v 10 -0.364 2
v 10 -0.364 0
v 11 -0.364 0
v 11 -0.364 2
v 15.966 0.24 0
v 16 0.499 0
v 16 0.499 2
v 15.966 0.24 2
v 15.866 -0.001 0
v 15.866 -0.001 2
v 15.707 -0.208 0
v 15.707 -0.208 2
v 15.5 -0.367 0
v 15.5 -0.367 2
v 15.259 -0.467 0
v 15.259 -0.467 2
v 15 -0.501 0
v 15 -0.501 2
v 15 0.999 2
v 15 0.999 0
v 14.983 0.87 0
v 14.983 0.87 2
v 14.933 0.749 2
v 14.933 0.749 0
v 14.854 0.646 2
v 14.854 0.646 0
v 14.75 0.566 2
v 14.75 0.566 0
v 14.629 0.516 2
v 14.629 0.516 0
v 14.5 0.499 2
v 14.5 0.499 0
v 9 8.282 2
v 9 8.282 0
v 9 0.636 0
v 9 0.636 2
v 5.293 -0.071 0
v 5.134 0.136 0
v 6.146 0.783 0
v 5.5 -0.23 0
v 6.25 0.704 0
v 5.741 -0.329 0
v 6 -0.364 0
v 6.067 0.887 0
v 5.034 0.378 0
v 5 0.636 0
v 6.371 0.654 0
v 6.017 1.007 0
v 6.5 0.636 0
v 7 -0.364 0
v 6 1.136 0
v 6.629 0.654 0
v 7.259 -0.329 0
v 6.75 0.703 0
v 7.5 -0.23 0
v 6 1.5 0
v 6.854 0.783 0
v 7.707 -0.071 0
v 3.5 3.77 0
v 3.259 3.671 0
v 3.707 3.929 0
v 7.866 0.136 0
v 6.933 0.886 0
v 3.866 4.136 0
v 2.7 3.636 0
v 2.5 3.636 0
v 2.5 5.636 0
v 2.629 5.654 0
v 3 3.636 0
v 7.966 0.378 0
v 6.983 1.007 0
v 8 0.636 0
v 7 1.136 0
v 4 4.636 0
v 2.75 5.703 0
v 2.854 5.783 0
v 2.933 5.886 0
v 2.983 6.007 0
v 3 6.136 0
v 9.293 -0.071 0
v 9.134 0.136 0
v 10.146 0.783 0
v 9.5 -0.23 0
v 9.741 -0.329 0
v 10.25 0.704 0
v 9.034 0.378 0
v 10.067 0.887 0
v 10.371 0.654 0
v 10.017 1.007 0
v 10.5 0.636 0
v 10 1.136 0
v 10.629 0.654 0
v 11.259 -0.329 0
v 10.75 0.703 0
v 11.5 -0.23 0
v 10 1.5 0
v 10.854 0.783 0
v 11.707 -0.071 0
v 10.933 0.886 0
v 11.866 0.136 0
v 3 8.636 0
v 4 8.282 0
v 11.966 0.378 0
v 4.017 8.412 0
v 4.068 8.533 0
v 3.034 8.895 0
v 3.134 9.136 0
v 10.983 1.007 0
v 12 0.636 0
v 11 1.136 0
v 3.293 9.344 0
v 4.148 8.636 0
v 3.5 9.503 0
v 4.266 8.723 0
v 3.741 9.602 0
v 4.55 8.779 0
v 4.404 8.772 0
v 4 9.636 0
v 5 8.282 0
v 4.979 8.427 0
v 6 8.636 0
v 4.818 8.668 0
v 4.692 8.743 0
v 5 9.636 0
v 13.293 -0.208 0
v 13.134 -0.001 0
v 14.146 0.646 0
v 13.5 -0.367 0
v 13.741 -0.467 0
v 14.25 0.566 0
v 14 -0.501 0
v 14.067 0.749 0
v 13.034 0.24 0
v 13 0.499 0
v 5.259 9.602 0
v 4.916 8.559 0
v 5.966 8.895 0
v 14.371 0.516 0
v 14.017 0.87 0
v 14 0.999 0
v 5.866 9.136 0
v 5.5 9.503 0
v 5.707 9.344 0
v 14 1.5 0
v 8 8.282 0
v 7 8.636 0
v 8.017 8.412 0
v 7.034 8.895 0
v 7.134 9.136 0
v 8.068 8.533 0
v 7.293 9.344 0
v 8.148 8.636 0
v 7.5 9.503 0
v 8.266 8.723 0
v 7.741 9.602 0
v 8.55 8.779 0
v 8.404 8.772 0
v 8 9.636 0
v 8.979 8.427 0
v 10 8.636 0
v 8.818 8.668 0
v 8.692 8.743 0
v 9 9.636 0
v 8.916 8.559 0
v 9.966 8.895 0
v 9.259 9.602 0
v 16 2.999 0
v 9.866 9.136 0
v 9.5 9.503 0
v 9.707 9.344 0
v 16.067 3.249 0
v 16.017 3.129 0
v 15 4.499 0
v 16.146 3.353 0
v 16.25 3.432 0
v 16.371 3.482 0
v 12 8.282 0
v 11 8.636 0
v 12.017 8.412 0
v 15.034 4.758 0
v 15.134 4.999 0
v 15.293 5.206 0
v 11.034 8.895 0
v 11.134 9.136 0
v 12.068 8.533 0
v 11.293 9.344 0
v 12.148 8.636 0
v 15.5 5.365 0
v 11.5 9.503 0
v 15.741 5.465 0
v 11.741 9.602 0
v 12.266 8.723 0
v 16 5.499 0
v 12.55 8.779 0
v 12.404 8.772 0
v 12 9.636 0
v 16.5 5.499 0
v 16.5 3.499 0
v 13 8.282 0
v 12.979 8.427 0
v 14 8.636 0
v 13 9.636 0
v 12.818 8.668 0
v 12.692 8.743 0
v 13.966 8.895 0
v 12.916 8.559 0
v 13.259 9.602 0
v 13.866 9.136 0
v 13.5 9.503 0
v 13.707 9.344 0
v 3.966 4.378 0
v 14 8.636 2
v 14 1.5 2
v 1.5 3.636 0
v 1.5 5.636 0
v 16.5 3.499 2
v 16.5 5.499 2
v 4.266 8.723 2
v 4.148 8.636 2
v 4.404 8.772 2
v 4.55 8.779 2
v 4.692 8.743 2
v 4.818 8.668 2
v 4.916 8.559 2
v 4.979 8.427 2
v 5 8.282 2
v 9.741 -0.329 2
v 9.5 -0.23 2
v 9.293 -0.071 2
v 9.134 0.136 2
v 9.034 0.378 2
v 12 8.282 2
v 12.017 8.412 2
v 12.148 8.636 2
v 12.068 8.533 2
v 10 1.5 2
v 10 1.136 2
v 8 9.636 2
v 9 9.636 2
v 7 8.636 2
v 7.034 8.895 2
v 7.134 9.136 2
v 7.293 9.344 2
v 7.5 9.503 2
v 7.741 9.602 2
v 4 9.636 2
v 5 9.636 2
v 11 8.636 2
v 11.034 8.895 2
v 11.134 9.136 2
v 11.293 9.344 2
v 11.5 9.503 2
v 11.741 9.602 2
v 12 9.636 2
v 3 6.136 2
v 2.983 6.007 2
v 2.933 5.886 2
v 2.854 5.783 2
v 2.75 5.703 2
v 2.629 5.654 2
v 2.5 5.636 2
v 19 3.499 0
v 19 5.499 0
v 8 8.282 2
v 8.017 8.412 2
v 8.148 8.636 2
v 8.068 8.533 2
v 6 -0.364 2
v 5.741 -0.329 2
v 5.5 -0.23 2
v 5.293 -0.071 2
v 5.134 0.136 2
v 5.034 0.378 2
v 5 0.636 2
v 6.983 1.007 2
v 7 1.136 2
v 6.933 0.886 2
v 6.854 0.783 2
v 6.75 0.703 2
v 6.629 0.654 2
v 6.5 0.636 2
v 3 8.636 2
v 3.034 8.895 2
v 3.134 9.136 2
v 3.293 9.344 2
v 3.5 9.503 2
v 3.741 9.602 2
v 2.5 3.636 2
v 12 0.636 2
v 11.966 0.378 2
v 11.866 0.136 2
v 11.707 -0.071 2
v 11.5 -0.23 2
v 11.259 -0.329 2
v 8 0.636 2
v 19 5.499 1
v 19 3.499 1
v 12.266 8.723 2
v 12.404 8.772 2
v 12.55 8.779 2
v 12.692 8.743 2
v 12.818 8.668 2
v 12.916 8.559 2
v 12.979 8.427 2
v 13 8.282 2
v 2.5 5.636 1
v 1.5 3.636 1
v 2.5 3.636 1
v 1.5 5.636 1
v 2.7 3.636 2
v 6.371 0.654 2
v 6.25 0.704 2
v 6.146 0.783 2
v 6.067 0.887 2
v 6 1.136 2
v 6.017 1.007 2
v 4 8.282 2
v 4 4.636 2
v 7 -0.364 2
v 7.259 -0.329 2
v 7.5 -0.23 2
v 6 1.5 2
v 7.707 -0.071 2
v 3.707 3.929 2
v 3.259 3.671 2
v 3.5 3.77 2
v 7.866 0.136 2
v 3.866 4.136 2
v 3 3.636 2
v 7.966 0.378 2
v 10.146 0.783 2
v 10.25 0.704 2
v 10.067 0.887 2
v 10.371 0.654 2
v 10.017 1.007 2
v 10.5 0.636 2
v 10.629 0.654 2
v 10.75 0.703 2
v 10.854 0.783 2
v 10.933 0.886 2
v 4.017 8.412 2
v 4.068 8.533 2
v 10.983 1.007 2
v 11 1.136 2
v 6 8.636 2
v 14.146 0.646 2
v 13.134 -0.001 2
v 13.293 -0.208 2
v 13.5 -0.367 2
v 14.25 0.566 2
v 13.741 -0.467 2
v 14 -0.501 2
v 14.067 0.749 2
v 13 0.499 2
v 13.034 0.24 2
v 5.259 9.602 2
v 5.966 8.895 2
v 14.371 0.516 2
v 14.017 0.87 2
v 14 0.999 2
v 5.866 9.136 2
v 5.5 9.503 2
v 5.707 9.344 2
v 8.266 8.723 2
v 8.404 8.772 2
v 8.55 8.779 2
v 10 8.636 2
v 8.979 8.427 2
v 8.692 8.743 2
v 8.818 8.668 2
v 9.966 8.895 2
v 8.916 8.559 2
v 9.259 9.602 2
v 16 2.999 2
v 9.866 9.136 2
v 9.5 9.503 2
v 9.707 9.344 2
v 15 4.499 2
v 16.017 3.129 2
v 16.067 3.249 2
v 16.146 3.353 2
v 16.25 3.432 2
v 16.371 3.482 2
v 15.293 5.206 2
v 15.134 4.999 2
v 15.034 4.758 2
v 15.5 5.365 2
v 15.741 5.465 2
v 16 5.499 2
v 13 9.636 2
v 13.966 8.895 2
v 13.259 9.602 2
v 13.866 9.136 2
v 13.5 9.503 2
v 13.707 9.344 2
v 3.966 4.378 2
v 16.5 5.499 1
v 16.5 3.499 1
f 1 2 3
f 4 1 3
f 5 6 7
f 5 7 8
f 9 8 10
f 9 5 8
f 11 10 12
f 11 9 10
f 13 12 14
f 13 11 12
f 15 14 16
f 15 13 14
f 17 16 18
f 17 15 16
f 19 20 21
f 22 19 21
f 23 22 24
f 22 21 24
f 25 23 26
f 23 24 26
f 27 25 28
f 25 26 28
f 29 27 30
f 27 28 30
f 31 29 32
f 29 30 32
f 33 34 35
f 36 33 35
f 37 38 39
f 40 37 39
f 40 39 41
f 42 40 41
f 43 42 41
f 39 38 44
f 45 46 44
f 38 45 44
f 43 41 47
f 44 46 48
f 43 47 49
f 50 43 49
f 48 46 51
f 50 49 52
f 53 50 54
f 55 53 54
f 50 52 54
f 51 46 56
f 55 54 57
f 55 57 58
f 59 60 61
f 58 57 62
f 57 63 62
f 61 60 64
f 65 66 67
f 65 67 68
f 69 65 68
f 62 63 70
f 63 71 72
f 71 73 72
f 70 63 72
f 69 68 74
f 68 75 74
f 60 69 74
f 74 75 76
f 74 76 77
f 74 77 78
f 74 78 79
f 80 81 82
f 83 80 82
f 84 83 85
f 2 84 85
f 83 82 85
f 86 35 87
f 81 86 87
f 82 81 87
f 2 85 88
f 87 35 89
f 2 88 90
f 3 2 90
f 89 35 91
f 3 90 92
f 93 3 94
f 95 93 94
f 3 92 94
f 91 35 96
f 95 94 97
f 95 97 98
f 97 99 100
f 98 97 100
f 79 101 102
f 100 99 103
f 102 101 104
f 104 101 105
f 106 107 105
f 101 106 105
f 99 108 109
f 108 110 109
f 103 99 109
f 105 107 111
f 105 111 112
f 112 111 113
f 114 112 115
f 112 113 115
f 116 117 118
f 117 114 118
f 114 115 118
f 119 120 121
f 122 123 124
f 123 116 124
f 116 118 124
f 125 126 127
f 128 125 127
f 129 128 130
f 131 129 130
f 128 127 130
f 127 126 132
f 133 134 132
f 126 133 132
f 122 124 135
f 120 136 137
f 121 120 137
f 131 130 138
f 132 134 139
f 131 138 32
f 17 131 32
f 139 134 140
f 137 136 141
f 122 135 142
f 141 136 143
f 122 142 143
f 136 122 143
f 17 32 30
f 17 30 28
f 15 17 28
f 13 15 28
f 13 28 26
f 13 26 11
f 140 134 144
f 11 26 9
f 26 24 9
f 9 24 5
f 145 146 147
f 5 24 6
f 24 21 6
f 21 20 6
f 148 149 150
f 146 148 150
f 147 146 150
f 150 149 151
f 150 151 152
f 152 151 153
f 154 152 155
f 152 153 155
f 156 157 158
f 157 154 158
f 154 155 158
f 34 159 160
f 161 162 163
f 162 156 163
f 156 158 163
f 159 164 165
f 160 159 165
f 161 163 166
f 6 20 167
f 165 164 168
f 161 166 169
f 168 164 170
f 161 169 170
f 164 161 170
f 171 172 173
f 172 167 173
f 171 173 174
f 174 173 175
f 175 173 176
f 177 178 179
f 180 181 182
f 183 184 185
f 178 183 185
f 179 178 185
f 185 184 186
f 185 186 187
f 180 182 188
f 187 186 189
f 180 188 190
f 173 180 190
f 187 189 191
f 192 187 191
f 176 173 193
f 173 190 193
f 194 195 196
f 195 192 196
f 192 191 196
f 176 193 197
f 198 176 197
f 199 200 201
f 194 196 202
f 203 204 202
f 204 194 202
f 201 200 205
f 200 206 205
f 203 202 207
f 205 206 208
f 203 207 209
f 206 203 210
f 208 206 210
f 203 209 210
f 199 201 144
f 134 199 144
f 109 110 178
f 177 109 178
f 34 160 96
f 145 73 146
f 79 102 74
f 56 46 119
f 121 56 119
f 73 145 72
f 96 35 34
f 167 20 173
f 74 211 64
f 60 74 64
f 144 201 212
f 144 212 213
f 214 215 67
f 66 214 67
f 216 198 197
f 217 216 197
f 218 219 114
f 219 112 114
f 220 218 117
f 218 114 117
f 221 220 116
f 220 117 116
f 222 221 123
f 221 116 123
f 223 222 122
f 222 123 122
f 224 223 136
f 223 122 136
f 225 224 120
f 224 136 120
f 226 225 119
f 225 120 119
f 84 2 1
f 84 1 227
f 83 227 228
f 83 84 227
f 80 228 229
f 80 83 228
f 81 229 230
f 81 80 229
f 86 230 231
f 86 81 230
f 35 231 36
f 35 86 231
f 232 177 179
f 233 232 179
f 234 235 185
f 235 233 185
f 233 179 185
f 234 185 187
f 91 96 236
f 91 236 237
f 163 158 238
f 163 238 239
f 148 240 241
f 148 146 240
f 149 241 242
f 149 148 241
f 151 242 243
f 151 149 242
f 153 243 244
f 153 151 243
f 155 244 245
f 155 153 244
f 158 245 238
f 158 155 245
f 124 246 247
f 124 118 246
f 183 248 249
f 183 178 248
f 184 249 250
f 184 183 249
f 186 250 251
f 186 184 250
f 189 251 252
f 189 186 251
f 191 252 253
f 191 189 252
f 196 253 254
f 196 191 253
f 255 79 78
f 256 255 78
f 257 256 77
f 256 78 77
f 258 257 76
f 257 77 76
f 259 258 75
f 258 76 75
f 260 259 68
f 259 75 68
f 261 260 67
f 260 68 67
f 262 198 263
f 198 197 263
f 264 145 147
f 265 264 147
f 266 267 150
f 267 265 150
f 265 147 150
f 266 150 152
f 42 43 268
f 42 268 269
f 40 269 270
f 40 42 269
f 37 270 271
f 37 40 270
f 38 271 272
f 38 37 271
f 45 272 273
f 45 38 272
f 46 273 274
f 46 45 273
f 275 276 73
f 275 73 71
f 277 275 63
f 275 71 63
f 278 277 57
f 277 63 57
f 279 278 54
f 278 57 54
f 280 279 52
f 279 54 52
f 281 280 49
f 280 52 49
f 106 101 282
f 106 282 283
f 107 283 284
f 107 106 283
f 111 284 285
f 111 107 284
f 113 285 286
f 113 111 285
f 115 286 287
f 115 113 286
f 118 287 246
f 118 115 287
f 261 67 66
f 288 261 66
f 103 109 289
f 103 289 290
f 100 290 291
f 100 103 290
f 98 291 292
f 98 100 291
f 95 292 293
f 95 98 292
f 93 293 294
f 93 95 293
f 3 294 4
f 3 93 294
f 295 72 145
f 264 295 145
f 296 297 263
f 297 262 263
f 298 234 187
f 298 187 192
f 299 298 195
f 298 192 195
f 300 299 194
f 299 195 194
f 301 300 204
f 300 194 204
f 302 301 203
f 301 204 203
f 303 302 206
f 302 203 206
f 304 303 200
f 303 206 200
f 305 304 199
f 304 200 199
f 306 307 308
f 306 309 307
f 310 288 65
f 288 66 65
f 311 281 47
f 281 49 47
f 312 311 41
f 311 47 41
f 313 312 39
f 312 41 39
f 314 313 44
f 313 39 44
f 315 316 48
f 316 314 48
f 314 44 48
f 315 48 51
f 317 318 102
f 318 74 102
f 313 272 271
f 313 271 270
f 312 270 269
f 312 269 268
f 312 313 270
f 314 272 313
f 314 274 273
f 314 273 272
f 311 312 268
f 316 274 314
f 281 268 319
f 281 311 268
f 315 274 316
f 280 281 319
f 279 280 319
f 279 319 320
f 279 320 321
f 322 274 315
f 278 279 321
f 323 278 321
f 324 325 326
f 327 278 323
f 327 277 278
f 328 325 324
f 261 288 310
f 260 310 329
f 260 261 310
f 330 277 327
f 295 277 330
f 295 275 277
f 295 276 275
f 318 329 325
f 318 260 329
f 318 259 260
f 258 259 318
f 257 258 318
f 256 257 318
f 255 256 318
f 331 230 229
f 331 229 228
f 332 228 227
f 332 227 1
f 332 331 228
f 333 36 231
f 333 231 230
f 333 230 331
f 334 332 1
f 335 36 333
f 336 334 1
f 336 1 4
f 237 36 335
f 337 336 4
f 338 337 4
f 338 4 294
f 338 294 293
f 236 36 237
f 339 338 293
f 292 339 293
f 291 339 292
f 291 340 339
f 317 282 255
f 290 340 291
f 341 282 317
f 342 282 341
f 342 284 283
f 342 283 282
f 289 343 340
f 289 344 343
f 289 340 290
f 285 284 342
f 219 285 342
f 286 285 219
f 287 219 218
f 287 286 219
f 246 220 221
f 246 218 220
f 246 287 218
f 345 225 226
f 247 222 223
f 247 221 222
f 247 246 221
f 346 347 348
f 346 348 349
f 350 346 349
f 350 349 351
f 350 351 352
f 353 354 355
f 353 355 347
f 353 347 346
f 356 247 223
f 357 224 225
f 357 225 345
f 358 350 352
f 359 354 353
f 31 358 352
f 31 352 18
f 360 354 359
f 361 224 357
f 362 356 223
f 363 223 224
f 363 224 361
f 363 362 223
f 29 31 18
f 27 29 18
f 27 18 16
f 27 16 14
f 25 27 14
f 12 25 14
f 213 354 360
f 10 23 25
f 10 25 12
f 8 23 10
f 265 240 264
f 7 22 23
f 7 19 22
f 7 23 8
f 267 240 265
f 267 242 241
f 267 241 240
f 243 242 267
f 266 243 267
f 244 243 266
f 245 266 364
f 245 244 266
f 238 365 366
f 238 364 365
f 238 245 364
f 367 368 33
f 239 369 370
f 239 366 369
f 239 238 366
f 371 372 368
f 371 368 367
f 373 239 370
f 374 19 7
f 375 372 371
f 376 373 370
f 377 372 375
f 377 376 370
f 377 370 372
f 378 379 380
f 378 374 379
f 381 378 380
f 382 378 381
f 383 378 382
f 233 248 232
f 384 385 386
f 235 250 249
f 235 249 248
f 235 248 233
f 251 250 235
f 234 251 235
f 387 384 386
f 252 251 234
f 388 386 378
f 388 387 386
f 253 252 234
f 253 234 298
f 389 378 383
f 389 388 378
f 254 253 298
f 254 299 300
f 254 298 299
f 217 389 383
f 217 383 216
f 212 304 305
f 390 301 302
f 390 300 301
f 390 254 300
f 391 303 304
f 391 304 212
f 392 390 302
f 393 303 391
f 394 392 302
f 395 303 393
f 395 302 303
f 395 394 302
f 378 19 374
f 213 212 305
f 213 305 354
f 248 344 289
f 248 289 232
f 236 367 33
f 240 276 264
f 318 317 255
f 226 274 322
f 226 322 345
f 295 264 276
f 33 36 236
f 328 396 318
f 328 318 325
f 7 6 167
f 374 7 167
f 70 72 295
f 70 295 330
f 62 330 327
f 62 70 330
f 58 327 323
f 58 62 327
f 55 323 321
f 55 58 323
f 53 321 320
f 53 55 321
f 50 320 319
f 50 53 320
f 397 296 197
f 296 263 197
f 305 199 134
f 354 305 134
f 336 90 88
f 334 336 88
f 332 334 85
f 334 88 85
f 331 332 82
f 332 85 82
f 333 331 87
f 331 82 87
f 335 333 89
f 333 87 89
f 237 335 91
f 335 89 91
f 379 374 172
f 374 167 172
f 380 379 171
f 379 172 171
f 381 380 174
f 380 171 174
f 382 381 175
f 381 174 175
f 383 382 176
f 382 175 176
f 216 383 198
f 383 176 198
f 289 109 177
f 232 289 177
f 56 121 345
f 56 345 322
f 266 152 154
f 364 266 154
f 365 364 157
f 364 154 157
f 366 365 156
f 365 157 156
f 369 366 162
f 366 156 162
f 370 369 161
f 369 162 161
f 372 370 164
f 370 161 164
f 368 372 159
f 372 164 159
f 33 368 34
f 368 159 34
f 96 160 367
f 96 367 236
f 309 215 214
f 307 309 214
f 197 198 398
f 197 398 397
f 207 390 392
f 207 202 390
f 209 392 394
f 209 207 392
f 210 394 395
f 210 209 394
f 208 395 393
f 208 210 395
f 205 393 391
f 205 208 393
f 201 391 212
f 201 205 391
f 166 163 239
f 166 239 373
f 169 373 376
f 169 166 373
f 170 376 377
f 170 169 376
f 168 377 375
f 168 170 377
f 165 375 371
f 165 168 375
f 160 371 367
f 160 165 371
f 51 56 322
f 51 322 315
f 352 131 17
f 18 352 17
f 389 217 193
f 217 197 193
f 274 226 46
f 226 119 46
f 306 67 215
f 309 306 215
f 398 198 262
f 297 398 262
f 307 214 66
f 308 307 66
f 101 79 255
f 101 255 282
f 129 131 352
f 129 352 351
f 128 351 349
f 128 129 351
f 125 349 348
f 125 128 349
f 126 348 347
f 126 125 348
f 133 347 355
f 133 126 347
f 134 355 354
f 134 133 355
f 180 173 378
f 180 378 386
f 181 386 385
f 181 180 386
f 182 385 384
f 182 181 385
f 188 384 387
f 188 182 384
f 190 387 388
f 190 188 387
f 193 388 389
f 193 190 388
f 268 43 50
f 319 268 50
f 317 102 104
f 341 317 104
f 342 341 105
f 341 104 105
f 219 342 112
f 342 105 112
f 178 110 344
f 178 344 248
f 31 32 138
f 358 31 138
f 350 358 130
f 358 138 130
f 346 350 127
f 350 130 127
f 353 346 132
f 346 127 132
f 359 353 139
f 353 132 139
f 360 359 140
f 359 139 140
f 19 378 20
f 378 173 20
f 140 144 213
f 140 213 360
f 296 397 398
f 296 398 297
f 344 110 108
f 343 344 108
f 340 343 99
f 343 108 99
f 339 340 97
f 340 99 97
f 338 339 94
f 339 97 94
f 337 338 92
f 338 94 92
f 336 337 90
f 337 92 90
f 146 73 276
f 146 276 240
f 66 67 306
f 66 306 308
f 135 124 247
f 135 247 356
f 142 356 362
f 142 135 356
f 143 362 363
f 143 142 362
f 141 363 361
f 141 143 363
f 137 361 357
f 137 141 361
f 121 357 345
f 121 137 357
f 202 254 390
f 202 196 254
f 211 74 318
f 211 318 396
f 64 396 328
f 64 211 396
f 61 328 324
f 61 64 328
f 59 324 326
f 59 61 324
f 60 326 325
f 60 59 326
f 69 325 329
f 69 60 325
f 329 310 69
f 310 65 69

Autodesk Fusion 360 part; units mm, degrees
sketch "Sketch1" plane through (0, 0, 0) normal (0, 0, 1) x (1, 0, 0)
  line L0 (2.5, 5.6365) -> (1.5, 5.6365)
  line L1 (1.5, 5.6365) -> (1.5, 3.6365)
  line L2 (1.5, 3.6365) -> (2.7001, 3.6365)
  line L3 (2.7001, 3.6365) -> (3, 3.6365)
  line L4 (4, 4.6365) -> (4, 8.2817)
  line L5 (5, 8.2817) -> (5, 0.6365)
  line L6 (3, 6.1365) -> (3, 8.6365)
  line L7 (4, 9.6365) -> (5, 9.6365)
  line L8 (6, 8.6365) -> (6, 1.5003)
  arc A0 (3, 3.6365) -> (4, 4.6365) centre (3, 4.6365) ccw
  arc A1 (4, 9.6365) -> (3, 8.6365) centre (4, 8.6365) ccw
  arc A2 (6, 8.6365) -> (5, 9.6365) centre (5, 8.6365) ccw
  arc A3 (4.1477, 8.6365) -> (4, 8.2817) centre (4.5, 8.2817) ccw
  arc A4 (5, 8.2817) -> (4.1477, 8.6365) centre (4.5, 8.2817) ccw
  line L9 (6, 1.5003) -> (6, 1.1365)
  line L10 (6, -0.3635) -> (7, -0.3635)
  arc A5 (5, 0.6365) -> (6, -0.3635) centre (6, 0.6365) ccw
  arc A6 (6, 1.1365) -> (6.4999, 0.6365) centre (6.5, 1.1365) ccw
  line L11 (7, 1.1365) -> (7, 8.6365)
  arc A7 (6.4999, 0.6365) -> (7, 1.1365) centre (6.5, 1.1365) ccw
  line L12 (8, 0.6365) -> (8, 8.2817)
  arc A8 (7, -0.3635) -> (8, 0.6365) centre (7, 0.6365) ccw
  arc A9 (2.5, 5.6365) -> (3, 6.1365) centre (2.5, 6.1365) ccw
  line L13 (2.5, 5.6365) -> (2.5, 3.6365)
  arc A10 (8, 9.6365) -> (7, 8.6365) centre (8, 8.6365) ccw
  arc A11 (8.1477, 8.6365) -> (8, 8.2817) centre (8.5, 8.2817) ccw
  arc A12 (9, 8.2817) -> (8.1477, 8.6365) centre (8.5, 8.2817) ccw
  line L14 (8, 9.6365) -> (9, 9.6365)
  arc A13 (10, 8.6365) -> (9, 9.6365) centre (9, 8.6365) ccw
  line L15 (9, 8.2817) -> (9, 0.6365)
  line L16 (10, 8.6365) -> (10, 1.5003)
  line L17 (11, 1.1365) -> (11, 8.6365)
  line L18 (12, 0.6365) -> (12, 8.2817)
  arc A14 (11, -0.3635) -> (12, 0.6365) centre (11, 0.6365) ccw
  arc A15 (10.4999, 0.6365) -> (11, 1.1365) centre (10.5, 1.1365) ccw
  arc A16 (10, 1.1365) -> (10.4999, 0.6365) centre (10.5, 1.1365) ccw
  line L19 (10, 1.5003) -> (10, 1.1365)
  arc A17 (9, 0.6365) -> (10, -0.3635) centre (10, 0.6365) ccw
  line L20 (10, -0.3635) -> (11, -0.3635)
  arc A18 (12, 9.6365) -> (11, 8.6365) centre (12, 8.6365) ccw
  arc A19 (12.1477, 8.6365) -> (12, 8.2817) centre (12.5, 8.2817) ccw
  arc A20 (13, 8.2817) -> (12.1477, 8.6365) centre (12.5, 8.2817) ccw
  line L21 (12, 9.6365) -> (13, 9.6365)
  arc A21 (14, 8.6365) -> (13, 9.6365) centre (13, 8.6365) ccw
  line L22 (13, 8.2817) -> (13, 0.4991)
  line L23 (14, 8.6365) -> (14, 1.5003)
  arc A22 (15, -0.5009) -> (16, 0.4991) centre (15, 0.4991) ccw
  arc A23 (14.4999, 0.4991) -> (15, 0.9991) centre (14.5, 0.9991) ccw
  arc A24 (14, 0.9991) -> (14.4999, 0.4991) centre (14.5, 0.9991) ccw
  line L24 (14, 1.5003) -> (14, 0.9991)
  arc A25 (13, 0.4991) -> (14, -0.5009) centre (14, 0.4991) ccw
  line L25 (14, -0.5009) -> (15, -0.5009)
  line L26 (16, 0.4991) -> (16, 2.9991)
  line L27 (16.5, 3.4991) -> (19, 3.4991)
  line L28 (19, 3.4991) -> (19, 5.4991)
  line L29 (19, 5.4991) -> (16, 5.4991)
  line L30 (16.5, 3.4991) -> (16.5, 5.4991)
  line L31 (15, 4.4991) -> (15, 0.9991)
  arc A26 (16.5, 3.4991) -> (16, 2.9991) centre (16.5, 2.9991) ccw
  arc A27 (16, 5.4991) -> (15, 4.4991) centre (16, 4.4991) ccw
  point P0 (3, 5.6365)
  point P1 (5, -0.3635)
  point P2 (16, 3.4991)
  dimension "d1" = 1
  dimension "d2" = 1
  dimension "d3" = 1
  dimension "d4" = 1
  dimension "d5" = 1
  dimension "d6" = 0.5
  dimension "d8" = 4
  dimension "d9" = 1
  dimension "d10" = 0.5
  dimension "d11" = 1
  dimension "d12" = 0.5
  dimension "d13" = 1
  dimension "d14" = 1
  dimension "d15" = 1
  dimension "d17" = 1
  dimension "d18" = 2
  dimension "d37" = 0.5
  dimension "d41" = 1
  dimension "d55" = 1
  dimension "d58" = 4
  dimension "d59" = 0
  dimension "d60" = 3
  dimension "d61" = 4
  dimension "d63" = 2
  dimension "d65" = 0.5
  dimension "d66" = 1
  dimension "d69" = 3
  dimension "d70" = 2.5
  dimension "d69" = 3
extrude "Extrude6" add sketch "Sketch1" along normal blind 1 contours L0 L1 L2 L13 | L27 L28 L29 L30 makes body 1 at (2.1666, 4.3032, 0) makes body 2 at (18.1667, 4.1658, 0)
extrude "Extrude5" add sketch "Sketch1" along normal blind 2 separate body contours L2 L3 L4 L5 L6 L7 L8 A0 A1 A2 A3 A4 L9 L10 A5 A6 L11 A7 L12 A8 A9 L13 A10 A11 A12 L14 A13 L15 L16 L17 L18 A14 A15 A16 L19 A17 L20 A18 A19 A20 L21 A21 L22 L23 A22 A23 A24 L24 A25 L25 L26 L29 L30 L31 A26 A27 makes body 3
equation "d69 = 557fdcba-3344-46c9-b6e3-04745b4f979f"
